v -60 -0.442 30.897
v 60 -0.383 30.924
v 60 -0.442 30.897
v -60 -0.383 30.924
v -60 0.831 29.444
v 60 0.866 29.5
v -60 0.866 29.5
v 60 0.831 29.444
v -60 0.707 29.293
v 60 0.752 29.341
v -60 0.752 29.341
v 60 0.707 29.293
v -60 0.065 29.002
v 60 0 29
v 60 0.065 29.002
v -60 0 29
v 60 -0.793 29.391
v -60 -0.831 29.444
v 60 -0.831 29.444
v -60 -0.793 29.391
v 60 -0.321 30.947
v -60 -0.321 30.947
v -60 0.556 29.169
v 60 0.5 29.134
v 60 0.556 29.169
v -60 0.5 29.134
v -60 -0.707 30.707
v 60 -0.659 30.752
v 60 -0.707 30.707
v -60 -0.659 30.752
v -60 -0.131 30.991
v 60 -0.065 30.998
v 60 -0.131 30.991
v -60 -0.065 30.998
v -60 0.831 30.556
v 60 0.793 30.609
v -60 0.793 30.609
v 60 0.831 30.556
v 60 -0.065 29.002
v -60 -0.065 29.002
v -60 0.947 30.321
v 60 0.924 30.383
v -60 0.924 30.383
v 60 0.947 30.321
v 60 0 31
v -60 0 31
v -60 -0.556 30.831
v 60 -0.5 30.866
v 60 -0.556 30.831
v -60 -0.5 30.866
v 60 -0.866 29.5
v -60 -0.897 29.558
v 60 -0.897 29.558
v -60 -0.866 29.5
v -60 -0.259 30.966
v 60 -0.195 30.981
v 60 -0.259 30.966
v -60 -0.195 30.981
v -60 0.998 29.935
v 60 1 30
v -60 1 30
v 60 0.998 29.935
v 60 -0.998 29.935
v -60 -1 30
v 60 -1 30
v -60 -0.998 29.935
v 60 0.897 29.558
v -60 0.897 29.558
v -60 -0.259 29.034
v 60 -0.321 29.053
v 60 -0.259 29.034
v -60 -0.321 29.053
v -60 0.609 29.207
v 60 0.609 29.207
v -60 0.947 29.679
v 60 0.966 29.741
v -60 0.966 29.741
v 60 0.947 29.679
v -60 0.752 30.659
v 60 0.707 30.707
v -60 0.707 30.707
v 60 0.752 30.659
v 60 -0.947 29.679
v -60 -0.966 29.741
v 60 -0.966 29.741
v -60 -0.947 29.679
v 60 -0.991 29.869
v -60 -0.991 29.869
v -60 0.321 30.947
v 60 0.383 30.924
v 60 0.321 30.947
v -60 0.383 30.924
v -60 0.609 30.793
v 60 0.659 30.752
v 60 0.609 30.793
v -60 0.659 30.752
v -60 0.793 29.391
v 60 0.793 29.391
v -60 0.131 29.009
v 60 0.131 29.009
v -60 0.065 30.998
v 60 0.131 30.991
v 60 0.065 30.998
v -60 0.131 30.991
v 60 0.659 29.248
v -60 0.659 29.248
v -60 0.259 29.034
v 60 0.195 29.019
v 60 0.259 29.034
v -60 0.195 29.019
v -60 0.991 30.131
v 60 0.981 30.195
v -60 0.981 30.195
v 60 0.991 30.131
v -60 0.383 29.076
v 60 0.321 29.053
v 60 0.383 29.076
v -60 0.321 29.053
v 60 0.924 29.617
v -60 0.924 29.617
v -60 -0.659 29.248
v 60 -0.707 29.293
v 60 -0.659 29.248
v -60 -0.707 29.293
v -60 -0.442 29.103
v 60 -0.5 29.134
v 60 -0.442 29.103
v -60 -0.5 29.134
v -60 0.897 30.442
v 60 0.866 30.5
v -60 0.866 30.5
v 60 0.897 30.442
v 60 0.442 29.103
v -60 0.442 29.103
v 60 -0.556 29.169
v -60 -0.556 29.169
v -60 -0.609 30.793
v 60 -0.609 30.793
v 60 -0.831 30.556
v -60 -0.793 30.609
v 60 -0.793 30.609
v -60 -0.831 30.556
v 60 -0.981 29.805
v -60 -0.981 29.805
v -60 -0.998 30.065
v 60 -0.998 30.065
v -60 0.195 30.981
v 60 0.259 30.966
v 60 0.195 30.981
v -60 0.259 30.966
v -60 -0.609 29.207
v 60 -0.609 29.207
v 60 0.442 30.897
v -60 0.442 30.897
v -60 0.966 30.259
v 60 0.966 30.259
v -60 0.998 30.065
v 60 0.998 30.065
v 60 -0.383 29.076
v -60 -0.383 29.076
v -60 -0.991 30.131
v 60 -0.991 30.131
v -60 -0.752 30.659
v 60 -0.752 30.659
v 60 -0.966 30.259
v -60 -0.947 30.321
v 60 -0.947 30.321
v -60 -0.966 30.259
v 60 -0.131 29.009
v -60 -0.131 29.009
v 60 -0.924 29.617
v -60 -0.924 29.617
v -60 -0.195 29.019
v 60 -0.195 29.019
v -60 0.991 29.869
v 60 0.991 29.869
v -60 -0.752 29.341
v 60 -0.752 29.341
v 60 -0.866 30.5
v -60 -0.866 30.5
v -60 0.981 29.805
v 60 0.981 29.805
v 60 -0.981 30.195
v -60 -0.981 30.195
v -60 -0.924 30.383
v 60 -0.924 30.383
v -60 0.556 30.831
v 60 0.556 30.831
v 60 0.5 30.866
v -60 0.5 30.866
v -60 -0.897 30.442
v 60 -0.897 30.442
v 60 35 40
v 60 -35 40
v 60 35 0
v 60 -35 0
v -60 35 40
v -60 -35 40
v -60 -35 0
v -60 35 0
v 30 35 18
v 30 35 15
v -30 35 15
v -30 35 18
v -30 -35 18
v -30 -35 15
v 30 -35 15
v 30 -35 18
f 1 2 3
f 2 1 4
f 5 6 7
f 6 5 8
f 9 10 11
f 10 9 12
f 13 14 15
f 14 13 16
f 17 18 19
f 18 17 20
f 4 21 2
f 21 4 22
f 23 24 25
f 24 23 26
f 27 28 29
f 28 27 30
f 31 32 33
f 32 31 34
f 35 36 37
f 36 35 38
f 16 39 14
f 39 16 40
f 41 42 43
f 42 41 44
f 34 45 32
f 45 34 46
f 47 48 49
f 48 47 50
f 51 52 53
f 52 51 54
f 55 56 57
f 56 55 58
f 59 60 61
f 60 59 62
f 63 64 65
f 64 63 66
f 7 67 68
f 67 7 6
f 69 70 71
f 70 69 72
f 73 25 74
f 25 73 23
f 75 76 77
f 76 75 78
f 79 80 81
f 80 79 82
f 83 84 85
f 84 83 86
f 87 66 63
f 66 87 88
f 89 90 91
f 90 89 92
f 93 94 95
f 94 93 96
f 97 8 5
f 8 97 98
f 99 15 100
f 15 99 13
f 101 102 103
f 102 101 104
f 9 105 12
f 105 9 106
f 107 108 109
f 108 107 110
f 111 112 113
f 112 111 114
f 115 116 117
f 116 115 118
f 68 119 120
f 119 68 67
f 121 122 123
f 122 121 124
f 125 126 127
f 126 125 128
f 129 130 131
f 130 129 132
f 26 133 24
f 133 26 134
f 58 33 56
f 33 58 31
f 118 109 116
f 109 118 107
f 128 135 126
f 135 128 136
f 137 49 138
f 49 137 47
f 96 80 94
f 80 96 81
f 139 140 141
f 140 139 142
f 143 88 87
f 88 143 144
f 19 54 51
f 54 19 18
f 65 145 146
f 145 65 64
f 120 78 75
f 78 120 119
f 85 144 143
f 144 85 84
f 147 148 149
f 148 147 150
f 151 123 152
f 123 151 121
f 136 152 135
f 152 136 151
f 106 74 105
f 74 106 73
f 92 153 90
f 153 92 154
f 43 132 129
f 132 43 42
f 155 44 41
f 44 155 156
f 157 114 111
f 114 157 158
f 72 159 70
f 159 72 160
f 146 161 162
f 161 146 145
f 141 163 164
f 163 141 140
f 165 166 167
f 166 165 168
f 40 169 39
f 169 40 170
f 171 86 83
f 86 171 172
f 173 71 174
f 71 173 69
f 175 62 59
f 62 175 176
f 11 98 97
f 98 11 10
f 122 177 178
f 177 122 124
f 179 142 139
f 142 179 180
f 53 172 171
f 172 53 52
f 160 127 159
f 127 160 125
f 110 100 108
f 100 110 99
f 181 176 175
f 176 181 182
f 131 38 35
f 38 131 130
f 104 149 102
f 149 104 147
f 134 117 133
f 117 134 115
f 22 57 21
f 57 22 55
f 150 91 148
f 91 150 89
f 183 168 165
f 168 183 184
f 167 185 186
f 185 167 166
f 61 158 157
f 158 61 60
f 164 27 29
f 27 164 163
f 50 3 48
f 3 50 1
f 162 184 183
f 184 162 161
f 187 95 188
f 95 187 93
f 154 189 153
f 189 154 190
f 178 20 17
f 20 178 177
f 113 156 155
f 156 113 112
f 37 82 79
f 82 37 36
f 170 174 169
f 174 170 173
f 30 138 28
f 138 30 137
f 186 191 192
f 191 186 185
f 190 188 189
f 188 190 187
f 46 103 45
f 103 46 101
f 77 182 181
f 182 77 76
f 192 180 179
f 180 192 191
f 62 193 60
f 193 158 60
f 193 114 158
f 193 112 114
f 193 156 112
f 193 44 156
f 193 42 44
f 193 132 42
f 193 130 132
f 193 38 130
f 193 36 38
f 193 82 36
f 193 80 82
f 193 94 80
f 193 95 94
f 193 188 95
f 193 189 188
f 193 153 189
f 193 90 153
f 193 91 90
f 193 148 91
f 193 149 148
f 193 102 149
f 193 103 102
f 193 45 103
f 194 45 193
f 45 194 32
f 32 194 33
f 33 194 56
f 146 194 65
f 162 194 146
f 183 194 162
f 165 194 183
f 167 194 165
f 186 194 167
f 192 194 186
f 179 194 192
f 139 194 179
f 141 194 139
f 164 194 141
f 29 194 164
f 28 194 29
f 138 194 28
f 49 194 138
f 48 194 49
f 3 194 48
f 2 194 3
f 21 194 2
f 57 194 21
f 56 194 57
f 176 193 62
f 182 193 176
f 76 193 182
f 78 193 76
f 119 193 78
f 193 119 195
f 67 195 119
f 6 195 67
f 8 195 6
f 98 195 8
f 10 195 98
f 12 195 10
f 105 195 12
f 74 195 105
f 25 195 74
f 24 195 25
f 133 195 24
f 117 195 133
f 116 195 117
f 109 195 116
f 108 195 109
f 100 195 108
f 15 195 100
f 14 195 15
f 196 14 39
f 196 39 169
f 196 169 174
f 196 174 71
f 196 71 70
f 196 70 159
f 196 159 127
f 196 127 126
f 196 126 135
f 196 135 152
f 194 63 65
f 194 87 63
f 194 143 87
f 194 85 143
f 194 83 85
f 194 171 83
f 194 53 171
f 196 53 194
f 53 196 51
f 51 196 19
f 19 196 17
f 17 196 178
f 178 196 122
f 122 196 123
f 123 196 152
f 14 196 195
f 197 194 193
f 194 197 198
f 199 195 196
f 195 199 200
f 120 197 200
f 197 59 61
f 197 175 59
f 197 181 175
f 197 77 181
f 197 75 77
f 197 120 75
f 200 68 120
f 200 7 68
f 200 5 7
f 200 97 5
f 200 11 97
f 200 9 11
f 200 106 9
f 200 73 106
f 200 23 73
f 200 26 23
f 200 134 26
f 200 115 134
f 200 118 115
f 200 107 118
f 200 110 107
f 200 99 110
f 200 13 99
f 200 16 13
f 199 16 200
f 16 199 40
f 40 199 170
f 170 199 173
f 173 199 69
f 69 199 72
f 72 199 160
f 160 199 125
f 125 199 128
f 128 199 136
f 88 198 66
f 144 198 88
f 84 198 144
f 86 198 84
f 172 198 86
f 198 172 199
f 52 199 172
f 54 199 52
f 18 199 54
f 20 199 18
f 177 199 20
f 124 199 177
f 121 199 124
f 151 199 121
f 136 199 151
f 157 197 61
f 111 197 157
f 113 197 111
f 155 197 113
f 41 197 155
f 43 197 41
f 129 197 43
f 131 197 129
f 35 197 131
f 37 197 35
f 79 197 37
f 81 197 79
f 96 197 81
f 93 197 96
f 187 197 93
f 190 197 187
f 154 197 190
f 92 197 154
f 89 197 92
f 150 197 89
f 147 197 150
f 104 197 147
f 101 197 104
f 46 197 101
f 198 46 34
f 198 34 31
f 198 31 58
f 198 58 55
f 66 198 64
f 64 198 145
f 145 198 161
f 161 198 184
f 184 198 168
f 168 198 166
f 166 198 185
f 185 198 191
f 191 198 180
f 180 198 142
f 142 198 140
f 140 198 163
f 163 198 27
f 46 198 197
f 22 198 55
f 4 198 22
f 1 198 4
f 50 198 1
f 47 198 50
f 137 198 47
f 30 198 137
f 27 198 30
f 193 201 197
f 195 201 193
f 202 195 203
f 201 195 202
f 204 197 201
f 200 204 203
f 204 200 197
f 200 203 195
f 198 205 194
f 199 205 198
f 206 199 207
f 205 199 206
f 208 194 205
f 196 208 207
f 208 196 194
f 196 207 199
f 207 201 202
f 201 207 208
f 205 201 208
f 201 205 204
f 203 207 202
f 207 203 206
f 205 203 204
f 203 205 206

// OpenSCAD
// Buffer tank for mini horizontal gel-electrophoresis box
// Print orientation: open top facing up (+Z), resting on XY plane at z = 0

// ---------------- Parameters ----------------
tank_x      = 120;   // outer length in X (mm)
tank_y      = 70;    // outer width in Y (mm)
tank_h      = 40;    // outer height in Z (mm)
wall        = 3;     // wall thickness (mm)
floor       = 3;     // floor thickness (mm)

platform_x  = 60;    // platform length in X (mm), centred
platform_y  = tank_y; // platform spans full inner width (mm)
platform_top = 18;   // platform top height above tank floor (mm)
// z = 18 is 15 mm above the inner floor (floor = 3 mm thick)

hole_d      = 2;     // electrode hole diameter (mm)
hole_y      = 0;     // electrode hole Y position (mm)
hole_z      = 30;    // electrode hole Z position (mm)

eps         = 0.5;   // cutter overshoot past faces (mm)

$fn = 96;

// ---------------- Derived ----------------
inner_x = tank_x - 2 * wall;   // 114 mm
inner_y = tank_y - 2 * wall;   // 64 mm
inner_z = tank_h - floor;      // 37 mm (floor at bottom, open top)

platform_z0 = platform_top - floor;  // platform bottom height = 15 mm
// platform thickness = platform_top - platform_z0 = 3 mm

// ---------------- Model ----------------
difference() {
    // Main tank body
    translate([-tank_x / 2, -tank_y / 2, 0])
        cube([tank_x, tank_y, tank_h]);

    // Raised platform in the middle, centred in X, spans full Y
    translate([-platform_x / 2, -platform_y / 2, platform_z0])
        cube([platform_x, platform_y, platform_top - platform_z0]);

    // Horizontal electrode holes through each end wall, along X
    for (s = [-1, 1])
        translate([s > 0 ? tank_x / 2 - eps : -tank_x / 2 - eps,
                   hole_y,
                   hole_z])
            rotate([0, 90, 0])
                cylinder(d = hole_d, h = tank_x + 2 * eps);
}
